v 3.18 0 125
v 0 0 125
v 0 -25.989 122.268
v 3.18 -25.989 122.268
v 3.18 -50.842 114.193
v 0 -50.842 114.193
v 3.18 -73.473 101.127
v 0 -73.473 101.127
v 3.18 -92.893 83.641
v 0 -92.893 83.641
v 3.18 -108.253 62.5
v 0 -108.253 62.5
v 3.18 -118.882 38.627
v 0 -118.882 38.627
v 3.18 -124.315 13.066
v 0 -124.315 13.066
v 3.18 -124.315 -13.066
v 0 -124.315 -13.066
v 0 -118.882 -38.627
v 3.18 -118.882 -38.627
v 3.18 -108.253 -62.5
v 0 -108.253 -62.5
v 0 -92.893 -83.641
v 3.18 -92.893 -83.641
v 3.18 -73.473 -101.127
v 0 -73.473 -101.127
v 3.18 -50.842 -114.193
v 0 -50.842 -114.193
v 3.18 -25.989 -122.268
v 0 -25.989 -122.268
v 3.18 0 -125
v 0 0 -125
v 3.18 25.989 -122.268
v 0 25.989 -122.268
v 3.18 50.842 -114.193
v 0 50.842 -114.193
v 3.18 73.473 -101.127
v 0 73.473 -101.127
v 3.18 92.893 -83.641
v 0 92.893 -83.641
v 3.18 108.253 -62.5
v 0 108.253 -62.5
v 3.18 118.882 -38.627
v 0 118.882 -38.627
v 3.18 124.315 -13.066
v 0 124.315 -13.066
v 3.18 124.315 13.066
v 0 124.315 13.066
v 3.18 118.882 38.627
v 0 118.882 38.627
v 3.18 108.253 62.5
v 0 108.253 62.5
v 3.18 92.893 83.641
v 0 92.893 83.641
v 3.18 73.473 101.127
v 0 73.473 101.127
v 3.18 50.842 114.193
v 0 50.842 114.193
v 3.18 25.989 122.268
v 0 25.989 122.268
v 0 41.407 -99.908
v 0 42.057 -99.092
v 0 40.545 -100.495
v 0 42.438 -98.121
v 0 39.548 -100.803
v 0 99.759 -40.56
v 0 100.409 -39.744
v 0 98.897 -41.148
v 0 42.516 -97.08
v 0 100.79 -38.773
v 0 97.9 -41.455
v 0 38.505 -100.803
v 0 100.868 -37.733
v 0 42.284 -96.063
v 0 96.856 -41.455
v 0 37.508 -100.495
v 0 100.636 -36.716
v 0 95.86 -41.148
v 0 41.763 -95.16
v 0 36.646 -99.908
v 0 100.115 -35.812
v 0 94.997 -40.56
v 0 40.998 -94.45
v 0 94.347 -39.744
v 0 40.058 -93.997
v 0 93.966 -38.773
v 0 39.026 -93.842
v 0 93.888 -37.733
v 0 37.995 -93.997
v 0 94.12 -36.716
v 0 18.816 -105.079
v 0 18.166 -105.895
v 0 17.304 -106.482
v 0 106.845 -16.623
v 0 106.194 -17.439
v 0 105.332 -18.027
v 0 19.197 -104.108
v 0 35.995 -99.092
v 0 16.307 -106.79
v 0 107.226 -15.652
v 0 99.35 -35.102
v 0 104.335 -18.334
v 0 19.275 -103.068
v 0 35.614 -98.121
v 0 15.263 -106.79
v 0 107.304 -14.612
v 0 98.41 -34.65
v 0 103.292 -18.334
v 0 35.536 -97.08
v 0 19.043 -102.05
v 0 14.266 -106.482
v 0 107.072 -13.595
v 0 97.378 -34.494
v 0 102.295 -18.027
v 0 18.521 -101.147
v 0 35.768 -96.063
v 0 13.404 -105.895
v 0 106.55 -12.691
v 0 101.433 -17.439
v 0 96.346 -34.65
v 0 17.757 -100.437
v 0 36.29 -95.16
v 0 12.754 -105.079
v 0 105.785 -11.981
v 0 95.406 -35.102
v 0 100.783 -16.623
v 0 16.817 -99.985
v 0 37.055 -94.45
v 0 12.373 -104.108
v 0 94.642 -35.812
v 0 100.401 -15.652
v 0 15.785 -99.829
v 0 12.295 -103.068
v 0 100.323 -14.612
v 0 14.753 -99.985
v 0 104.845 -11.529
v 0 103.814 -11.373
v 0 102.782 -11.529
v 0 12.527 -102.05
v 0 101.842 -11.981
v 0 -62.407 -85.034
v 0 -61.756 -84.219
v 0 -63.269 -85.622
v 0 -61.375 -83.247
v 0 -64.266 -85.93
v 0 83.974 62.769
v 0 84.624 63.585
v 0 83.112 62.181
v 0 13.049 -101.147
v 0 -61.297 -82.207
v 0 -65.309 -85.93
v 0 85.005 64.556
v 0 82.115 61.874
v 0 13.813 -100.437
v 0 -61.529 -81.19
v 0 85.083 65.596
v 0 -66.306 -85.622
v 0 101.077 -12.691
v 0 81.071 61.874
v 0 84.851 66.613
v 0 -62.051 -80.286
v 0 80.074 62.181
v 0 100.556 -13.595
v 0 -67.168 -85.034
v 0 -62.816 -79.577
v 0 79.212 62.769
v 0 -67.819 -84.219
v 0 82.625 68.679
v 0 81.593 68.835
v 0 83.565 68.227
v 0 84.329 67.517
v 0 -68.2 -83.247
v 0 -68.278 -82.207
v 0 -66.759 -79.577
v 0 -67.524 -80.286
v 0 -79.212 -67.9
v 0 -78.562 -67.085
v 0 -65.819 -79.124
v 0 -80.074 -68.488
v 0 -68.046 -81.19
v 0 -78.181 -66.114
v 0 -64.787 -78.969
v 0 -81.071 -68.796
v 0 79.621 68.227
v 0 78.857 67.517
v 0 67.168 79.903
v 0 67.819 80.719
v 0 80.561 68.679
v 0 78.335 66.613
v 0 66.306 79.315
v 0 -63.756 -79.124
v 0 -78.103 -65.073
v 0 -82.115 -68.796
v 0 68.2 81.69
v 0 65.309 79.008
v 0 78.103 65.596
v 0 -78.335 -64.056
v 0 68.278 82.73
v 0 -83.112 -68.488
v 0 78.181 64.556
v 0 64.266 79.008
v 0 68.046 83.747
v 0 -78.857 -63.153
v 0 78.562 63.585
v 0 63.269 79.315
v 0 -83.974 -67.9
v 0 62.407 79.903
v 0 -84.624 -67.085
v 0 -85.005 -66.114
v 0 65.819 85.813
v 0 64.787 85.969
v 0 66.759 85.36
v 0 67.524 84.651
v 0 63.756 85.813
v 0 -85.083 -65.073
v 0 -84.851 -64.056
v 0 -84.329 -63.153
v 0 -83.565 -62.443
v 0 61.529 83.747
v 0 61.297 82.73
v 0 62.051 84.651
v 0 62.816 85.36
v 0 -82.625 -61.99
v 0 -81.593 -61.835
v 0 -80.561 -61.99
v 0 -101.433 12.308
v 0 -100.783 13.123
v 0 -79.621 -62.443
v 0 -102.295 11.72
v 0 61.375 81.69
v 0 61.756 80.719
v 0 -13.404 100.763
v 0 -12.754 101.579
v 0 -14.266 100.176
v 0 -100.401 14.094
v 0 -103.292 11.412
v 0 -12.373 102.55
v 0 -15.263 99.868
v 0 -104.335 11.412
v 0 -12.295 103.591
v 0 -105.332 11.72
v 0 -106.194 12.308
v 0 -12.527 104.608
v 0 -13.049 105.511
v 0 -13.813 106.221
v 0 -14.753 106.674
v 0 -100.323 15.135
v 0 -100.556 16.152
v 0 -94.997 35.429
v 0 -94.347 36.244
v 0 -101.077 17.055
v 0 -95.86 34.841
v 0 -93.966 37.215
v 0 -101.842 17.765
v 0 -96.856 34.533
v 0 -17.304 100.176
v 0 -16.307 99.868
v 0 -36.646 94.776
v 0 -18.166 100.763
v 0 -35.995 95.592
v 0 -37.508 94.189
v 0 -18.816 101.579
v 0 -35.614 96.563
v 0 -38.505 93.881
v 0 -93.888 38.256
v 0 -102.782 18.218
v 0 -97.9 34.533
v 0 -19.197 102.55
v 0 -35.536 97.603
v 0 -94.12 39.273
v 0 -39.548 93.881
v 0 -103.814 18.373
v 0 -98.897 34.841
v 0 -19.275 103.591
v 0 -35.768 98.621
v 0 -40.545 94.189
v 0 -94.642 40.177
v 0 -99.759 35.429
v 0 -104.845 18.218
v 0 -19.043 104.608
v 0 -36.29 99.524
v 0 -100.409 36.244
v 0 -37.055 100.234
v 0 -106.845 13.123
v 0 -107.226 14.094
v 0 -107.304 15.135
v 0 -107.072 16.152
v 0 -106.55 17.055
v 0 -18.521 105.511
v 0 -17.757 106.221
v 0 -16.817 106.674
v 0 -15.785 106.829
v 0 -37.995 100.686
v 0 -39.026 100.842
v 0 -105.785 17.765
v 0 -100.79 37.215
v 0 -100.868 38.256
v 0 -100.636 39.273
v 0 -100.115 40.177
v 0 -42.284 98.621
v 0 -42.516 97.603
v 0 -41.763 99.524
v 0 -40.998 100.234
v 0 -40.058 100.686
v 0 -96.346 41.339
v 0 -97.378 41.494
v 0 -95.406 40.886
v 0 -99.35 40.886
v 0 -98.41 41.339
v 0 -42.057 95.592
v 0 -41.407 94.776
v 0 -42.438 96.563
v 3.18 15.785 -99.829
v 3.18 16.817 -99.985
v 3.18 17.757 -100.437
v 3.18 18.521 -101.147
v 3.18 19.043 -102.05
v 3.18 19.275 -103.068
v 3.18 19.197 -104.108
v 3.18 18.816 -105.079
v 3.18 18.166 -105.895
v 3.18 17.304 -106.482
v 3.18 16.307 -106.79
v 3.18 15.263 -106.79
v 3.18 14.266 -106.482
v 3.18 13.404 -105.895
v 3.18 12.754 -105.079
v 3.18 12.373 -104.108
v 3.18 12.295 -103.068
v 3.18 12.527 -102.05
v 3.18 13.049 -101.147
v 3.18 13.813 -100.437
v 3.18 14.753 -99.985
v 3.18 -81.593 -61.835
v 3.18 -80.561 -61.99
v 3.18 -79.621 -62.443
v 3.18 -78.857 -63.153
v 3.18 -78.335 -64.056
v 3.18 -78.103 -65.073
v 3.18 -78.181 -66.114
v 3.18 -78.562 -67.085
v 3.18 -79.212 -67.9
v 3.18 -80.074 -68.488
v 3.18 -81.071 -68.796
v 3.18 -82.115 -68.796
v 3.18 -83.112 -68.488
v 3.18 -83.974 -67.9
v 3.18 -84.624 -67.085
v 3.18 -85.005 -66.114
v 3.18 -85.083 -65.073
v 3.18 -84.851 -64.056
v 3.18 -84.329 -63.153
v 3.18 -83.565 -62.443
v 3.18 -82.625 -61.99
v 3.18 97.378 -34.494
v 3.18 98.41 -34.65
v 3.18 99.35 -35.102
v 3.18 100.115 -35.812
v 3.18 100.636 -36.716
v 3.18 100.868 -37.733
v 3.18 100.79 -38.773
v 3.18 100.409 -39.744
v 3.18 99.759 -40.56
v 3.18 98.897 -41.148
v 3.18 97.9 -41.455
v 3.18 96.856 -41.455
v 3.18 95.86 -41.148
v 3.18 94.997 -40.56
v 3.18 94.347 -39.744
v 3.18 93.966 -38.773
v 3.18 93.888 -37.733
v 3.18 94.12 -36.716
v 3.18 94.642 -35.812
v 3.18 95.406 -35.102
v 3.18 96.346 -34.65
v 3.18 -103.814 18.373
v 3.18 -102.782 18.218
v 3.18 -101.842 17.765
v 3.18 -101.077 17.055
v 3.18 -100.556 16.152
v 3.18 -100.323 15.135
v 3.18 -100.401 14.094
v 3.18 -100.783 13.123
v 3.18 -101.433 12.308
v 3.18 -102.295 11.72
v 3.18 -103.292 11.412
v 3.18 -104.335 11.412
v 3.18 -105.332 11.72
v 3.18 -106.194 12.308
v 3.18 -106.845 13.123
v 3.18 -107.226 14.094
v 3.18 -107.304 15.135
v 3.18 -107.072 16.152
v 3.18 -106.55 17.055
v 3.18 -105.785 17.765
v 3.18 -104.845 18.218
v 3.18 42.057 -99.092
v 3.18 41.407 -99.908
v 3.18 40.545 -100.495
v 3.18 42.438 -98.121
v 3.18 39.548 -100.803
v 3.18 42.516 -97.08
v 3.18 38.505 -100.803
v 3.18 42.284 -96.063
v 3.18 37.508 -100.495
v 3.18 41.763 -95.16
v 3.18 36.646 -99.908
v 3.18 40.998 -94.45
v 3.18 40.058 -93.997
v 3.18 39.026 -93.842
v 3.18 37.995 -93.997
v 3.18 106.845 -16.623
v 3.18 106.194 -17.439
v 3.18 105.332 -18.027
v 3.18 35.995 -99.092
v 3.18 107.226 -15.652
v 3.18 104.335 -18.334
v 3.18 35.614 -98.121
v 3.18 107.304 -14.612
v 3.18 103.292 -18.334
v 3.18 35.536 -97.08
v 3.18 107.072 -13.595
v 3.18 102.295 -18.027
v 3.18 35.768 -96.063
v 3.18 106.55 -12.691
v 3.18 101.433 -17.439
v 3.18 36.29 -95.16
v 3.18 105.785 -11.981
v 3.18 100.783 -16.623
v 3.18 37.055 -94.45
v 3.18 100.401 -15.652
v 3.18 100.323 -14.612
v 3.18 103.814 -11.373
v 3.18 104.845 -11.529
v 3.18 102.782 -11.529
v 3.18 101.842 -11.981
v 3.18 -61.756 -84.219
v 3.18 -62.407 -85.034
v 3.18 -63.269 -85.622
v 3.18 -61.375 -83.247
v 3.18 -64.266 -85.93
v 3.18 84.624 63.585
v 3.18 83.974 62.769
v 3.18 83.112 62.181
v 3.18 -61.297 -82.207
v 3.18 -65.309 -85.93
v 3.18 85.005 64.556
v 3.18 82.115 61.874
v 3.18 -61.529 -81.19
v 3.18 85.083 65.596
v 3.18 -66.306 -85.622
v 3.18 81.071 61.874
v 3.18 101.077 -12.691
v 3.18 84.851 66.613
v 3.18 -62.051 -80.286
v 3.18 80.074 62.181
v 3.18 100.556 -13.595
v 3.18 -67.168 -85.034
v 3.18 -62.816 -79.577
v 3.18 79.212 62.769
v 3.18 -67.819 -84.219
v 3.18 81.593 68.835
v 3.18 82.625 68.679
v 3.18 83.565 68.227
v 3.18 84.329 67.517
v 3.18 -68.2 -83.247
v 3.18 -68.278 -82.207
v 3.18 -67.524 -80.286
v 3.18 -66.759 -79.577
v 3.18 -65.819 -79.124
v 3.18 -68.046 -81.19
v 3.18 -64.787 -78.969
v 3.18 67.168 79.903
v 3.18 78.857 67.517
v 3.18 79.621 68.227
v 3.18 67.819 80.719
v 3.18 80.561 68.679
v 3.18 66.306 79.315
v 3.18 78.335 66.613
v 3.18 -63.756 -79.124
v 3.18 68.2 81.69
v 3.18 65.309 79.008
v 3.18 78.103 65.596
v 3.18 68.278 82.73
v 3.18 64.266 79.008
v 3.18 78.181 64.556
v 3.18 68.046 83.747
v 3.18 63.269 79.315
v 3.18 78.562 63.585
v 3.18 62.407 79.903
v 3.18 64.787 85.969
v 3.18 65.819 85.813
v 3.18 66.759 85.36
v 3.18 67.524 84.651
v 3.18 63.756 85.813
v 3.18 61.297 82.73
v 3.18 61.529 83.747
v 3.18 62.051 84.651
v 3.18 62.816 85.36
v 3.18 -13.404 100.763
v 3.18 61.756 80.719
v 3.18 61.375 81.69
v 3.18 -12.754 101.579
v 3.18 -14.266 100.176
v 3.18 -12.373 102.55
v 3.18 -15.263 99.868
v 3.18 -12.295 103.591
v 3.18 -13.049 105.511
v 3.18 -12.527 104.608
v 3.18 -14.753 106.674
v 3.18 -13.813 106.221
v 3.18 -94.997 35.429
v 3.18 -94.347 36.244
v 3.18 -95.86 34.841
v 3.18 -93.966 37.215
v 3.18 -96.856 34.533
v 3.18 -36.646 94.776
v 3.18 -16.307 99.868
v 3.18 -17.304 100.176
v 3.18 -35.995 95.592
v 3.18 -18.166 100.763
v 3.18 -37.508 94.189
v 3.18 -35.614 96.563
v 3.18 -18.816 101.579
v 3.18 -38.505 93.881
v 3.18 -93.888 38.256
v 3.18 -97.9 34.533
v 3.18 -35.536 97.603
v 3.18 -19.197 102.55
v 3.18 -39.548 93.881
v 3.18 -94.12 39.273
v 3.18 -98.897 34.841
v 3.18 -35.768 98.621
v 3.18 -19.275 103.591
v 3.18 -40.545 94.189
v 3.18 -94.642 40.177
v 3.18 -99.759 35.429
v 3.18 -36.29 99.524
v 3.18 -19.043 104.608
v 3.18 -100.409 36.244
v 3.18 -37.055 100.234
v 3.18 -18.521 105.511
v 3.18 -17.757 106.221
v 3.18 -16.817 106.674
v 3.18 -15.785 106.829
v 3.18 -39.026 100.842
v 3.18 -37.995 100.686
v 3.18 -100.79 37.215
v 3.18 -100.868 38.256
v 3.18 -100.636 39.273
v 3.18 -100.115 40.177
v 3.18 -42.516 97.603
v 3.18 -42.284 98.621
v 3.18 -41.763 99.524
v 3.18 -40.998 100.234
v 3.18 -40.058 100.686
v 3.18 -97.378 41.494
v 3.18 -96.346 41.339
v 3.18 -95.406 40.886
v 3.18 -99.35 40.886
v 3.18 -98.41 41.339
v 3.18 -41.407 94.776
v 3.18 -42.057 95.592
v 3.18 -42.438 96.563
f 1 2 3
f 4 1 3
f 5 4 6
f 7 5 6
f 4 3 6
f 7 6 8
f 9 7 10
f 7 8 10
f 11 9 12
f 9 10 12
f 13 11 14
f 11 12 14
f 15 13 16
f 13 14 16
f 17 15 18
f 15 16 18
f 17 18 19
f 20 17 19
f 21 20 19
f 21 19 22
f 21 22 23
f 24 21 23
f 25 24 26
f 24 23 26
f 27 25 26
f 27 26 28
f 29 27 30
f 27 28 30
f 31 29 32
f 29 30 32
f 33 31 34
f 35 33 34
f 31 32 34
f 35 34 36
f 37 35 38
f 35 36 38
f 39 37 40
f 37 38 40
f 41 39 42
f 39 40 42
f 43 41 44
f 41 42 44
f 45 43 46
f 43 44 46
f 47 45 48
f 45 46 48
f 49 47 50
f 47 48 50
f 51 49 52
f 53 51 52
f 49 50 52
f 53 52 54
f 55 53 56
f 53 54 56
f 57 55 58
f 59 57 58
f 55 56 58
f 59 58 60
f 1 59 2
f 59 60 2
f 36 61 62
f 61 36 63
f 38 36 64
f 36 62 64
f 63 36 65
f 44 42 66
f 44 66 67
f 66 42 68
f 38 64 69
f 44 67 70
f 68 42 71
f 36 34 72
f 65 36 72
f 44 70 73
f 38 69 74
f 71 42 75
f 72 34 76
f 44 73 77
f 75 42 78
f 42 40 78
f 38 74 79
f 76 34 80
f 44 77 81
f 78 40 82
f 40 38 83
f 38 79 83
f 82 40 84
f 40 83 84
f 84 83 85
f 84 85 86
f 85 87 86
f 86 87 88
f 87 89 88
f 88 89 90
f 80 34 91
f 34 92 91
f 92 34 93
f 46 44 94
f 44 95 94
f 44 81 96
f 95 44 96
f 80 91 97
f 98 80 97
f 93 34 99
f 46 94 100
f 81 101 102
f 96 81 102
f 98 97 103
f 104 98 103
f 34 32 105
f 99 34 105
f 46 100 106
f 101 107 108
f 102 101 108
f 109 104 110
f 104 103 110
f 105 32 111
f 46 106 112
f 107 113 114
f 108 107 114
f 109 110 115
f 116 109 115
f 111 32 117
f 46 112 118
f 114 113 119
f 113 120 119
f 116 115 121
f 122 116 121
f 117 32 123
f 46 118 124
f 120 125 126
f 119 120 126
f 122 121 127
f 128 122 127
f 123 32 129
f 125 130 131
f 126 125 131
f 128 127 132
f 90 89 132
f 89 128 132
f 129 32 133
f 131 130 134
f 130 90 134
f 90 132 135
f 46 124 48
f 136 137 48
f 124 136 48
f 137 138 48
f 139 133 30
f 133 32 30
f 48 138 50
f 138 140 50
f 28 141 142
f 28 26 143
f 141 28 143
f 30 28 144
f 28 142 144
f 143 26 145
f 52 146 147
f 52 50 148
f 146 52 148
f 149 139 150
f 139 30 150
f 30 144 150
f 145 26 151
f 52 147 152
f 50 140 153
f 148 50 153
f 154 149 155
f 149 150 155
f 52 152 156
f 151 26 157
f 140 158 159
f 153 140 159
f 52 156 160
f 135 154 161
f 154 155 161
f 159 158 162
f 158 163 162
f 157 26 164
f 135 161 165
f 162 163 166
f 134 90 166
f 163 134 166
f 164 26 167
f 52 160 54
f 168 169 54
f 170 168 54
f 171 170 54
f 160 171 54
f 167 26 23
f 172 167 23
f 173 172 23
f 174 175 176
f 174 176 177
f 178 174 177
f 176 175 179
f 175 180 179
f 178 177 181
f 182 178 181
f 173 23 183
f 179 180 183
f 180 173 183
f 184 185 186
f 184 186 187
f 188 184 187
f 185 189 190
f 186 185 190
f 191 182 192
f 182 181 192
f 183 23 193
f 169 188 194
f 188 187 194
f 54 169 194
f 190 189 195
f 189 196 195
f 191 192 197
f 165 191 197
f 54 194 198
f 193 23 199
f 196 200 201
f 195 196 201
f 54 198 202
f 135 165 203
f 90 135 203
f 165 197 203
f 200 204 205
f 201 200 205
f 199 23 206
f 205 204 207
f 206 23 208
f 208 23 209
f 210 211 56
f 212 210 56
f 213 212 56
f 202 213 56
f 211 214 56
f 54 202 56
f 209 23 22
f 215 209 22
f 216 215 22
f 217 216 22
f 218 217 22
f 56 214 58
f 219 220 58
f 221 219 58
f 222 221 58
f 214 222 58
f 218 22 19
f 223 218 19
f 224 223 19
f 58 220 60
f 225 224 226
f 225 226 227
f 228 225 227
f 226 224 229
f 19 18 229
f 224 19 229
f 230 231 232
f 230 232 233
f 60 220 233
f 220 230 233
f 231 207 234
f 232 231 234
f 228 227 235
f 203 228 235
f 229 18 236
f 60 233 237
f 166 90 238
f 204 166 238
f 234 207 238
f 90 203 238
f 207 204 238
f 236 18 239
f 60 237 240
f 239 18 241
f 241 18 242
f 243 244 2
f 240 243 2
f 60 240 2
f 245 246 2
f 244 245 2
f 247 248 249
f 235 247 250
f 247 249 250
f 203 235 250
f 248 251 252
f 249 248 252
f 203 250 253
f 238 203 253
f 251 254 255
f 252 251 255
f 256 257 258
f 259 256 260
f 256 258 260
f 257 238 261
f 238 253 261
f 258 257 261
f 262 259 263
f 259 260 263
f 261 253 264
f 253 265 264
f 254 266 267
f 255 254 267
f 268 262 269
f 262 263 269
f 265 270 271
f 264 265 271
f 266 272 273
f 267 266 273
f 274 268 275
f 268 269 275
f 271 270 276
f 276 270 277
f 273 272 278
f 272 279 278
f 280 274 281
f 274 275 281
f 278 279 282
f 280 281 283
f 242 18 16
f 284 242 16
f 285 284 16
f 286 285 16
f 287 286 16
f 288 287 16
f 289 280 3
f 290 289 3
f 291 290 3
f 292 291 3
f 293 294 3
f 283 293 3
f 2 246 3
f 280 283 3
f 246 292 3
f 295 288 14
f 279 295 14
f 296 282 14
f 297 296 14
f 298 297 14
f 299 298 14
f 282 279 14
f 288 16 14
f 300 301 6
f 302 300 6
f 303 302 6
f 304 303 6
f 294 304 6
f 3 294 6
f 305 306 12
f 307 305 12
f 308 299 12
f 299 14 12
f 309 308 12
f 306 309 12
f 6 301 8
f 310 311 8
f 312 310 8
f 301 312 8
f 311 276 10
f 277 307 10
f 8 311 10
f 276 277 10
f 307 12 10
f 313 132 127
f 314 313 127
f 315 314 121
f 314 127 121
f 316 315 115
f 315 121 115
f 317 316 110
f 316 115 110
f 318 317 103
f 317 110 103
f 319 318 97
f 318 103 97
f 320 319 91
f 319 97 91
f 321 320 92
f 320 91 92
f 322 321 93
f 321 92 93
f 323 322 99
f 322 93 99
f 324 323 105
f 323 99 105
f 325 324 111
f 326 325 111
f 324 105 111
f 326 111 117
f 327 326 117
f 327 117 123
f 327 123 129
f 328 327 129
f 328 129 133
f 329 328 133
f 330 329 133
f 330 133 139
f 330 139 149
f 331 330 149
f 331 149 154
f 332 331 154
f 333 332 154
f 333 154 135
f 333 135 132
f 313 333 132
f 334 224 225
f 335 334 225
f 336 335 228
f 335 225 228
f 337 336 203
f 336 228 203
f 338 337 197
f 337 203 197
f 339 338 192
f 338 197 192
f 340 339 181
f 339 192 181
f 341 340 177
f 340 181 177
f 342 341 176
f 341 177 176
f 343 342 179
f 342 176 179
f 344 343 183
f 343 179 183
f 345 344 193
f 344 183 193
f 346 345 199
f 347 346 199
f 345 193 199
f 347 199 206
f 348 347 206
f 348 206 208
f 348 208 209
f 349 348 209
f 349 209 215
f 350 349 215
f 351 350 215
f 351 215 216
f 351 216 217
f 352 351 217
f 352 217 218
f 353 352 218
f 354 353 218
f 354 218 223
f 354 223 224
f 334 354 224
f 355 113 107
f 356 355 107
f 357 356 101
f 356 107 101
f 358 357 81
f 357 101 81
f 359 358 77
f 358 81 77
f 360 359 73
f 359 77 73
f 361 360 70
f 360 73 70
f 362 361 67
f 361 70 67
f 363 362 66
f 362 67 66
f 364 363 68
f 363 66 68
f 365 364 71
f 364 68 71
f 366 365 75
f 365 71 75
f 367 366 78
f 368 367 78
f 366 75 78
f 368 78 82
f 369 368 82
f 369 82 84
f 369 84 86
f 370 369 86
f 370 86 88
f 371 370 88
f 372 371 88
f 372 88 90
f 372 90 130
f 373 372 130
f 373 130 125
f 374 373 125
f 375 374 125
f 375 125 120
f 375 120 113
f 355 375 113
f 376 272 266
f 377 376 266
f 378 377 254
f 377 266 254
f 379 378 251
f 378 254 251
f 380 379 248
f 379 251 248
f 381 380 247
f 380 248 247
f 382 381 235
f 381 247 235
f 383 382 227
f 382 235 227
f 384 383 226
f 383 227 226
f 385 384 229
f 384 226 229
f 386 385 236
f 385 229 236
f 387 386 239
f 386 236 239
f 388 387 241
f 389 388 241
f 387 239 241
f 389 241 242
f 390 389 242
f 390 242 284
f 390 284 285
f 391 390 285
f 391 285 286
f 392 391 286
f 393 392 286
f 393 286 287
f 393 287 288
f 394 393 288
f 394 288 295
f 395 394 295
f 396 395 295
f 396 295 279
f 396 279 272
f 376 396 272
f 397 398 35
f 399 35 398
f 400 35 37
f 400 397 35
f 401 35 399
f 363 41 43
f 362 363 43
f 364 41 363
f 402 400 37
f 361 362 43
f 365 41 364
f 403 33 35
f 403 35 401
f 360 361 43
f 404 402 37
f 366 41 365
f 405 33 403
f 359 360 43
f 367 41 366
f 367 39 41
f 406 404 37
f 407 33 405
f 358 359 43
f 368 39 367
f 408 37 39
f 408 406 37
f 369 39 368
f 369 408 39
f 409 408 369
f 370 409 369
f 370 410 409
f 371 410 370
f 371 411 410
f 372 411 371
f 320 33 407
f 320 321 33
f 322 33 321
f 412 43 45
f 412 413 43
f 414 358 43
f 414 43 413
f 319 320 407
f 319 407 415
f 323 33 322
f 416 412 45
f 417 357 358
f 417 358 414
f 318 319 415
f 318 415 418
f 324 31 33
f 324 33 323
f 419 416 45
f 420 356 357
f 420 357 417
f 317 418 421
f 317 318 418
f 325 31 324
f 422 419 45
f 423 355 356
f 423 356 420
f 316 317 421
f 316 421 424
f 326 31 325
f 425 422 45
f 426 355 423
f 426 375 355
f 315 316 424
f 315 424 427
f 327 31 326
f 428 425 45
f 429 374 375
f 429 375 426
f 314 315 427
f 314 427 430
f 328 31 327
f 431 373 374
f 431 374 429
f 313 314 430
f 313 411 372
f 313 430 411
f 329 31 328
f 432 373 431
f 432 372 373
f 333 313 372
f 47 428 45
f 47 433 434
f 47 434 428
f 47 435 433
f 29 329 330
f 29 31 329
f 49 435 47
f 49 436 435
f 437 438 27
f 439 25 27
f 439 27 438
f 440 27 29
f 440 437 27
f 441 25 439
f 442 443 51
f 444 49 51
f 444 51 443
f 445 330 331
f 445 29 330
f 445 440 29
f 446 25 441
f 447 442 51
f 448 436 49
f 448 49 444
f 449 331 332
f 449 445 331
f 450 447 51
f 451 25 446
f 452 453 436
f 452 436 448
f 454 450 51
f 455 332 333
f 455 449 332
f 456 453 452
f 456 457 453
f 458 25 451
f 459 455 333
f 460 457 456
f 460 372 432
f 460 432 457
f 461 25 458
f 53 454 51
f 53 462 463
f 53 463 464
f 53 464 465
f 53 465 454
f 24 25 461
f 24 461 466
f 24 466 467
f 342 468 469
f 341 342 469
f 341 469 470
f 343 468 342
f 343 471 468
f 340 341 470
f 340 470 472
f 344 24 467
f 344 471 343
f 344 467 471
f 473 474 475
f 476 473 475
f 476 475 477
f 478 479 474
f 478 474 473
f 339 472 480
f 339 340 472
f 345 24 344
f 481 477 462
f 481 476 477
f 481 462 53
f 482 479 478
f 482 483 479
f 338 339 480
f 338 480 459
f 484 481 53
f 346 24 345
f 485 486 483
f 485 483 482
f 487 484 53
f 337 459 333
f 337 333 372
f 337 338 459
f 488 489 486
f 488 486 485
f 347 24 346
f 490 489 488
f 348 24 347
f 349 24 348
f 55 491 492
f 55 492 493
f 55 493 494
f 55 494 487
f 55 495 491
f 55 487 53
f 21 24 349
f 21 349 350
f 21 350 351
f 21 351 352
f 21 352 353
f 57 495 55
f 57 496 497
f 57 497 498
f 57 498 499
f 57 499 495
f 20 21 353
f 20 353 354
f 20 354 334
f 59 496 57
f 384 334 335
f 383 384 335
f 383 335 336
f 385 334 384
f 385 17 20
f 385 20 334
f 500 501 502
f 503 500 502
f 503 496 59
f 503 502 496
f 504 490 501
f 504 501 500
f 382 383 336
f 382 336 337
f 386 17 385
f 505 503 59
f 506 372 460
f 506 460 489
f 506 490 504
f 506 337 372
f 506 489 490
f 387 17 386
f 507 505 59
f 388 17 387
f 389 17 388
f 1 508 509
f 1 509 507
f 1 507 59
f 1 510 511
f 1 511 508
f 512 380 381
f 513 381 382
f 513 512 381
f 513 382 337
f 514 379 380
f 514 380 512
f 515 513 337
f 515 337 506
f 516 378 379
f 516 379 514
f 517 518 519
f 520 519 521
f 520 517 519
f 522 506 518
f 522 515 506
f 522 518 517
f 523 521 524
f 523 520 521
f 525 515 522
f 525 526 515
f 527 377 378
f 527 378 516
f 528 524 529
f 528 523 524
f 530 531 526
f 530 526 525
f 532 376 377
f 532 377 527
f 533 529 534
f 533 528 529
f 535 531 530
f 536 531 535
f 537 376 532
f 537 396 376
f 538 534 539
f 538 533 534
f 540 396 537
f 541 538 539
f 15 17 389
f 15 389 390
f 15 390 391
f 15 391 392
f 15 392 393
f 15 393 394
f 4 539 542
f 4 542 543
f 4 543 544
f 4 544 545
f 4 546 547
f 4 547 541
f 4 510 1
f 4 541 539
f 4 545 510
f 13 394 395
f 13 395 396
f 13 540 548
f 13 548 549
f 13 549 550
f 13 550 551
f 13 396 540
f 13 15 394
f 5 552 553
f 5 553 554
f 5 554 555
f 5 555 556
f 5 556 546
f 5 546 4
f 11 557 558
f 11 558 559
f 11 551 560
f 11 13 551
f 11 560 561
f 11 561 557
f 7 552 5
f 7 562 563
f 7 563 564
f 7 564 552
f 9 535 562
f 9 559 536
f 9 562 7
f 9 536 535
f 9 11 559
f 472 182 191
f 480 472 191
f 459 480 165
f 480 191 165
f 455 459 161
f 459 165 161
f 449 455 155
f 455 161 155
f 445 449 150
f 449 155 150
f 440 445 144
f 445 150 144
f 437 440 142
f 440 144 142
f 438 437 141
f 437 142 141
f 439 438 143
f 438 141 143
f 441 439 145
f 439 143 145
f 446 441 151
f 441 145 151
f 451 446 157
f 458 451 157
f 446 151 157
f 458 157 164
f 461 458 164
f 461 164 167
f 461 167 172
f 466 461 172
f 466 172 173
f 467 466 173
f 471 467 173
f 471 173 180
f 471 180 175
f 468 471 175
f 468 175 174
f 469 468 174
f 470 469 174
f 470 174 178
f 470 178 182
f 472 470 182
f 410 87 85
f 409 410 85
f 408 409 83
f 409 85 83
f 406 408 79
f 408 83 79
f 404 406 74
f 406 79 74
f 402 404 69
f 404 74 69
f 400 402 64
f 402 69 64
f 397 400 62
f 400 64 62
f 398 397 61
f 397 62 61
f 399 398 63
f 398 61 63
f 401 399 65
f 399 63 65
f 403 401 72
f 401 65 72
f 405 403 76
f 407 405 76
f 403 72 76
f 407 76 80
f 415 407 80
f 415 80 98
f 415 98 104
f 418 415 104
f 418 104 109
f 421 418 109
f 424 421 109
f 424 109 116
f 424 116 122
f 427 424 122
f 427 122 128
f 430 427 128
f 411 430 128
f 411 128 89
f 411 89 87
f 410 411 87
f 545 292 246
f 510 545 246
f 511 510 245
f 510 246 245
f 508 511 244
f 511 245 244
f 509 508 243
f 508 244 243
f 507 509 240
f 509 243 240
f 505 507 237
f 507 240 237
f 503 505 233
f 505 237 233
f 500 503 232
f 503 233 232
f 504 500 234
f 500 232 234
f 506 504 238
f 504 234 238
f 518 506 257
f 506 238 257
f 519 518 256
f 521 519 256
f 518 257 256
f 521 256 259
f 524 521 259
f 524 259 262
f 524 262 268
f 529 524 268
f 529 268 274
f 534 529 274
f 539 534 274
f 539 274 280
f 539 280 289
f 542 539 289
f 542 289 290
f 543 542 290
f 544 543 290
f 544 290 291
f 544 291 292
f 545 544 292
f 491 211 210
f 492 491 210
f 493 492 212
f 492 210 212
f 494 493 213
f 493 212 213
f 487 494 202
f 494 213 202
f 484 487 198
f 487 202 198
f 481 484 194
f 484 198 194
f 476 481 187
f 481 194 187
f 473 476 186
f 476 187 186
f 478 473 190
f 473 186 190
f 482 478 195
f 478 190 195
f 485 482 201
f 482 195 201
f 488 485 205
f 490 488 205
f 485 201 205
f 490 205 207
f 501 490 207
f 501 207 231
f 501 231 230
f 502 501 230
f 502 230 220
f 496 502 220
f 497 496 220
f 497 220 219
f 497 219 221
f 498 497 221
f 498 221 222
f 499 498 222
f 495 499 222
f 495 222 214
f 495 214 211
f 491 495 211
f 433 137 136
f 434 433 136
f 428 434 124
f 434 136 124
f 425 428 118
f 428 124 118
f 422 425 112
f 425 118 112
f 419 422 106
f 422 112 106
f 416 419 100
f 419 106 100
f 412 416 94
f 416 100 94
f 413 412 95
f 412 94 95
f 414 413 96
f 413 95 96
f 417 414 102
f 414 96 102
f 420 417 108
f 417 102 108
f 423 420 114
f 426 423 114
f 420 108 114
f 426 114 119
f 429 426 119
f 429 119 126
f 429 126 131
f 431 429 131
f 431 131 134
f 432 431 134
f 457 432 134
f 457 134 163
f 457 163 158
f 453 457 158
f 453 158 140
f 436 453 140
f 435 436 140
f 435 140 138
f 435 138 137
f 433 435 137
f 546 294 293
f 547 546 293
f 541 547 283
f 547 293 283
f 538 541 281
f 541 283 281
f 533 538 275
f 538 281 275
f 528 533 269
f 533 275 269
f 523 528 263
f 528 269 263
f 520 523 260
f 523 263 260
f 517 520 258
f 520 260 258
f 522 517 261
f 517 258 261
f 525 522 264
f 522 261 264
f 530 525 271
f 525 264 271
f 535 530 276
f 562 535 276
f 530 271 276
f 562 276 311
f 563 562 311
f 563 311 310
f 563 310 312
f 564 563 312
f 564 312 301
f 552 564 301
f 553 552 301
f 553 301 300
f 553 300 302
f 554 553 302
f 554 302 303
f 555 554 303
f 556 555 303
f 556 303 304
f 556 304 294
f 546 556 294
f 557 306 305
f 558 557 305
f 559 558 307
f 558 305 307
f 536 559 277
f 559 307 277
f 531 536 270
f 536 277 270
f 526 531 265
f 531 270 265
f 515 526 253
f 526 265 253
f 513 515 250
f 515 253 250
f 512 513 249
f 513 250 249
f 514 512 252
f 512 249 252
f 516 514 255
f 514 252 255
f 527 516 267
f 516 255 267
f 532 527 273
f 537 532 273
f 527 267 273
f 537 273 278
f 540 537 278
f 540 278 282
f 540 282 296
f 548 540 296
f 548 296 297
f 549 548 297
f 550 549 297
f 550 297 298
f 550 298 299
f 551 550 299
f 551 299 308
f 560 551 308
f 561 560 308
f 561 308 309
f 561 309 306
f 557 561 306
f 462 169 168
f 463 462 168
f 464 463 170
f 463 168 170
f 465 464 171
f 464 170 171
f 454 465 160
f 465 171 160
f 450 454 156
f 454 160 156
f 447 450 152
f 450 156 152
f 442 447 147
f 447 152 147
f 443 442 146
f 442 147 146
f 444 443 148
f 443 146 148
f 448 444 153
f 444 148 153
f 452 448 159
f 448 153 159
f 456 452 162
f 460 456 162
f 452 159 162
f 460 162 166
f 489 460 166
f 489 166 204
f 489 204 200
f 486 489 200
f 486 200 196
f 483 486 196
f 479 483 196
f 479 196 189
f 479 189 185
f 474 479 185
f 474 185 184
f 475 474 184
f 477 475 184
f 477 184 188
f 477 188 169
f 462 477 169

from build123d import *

# Parameters (mm, degrees)
SKETCH2_R           = 125
BOSS_EXTRUDE1_DEPTH = 3.18
SKETCH3_R           = 3.5
CUT_EXTRUDE1_DEPTH  = 177.80529517


with BuildPart() as part:
    # Sketch2 → Boss-Extrude1 (new body)
    with BuildSketch(Plane(origin=(0, 0, 0), x_dir=(0, 0, -1), z_dir=(1, 0, 0))):
        with Locations(Location((0, 0, 0), (0, 0, 180))):
            Circle(SKETCH2_R)
    extrude(amount=BOSS_EXTRUDE1_DEPTH)

    # Sketch3 → Cut-Extrude1 (cut, through all)
    with BuildSketch(Plane.ZY):
        with Locations((103.329056078, -15.785012269)):
            Circle(SKETCH3_R)
        with Locations((97.341910159, -39.026227464)):
            Circle(SKETCH3_R)
        with Locations((14.873250681, -103.813680783)):
            Circle(SKETCH3_R)
        with Locations((37.994306415, -97.378093647)):
            Circle(SKETCH3_R)
        with Locations((-65.334749663, -81.593081378)):
            Circle(SKETCH3_R)
        with Locations((-82.468659478, -64.787453318)):
            Circle(SKETCH3_R)
        with Locations((-97.341910159, 39.026227464)):
            Circle(SKETCH3_R)
        with Locations((-103.329056078, 15.785012269)):
            Circle(SKETCH3_R)
        with Locations((-37.994306415, 97.378093647)):
            Circle(SKETCH3_R)
        with Locations((-14.873250681, 103.813680783)):
            Circle(SKETCH3_R)
        with Locations((65.334749663, 81.593081378)):
            Circle(SKETCH3_R)
        with Locations((82.468659478, 64.787453318)):
            Circle(SKETCH3_R)
    extrude(amount=-CUT_EXTRUDE1_DEPTH, mode=Mode.SUBTRACT)


solid = part.part
